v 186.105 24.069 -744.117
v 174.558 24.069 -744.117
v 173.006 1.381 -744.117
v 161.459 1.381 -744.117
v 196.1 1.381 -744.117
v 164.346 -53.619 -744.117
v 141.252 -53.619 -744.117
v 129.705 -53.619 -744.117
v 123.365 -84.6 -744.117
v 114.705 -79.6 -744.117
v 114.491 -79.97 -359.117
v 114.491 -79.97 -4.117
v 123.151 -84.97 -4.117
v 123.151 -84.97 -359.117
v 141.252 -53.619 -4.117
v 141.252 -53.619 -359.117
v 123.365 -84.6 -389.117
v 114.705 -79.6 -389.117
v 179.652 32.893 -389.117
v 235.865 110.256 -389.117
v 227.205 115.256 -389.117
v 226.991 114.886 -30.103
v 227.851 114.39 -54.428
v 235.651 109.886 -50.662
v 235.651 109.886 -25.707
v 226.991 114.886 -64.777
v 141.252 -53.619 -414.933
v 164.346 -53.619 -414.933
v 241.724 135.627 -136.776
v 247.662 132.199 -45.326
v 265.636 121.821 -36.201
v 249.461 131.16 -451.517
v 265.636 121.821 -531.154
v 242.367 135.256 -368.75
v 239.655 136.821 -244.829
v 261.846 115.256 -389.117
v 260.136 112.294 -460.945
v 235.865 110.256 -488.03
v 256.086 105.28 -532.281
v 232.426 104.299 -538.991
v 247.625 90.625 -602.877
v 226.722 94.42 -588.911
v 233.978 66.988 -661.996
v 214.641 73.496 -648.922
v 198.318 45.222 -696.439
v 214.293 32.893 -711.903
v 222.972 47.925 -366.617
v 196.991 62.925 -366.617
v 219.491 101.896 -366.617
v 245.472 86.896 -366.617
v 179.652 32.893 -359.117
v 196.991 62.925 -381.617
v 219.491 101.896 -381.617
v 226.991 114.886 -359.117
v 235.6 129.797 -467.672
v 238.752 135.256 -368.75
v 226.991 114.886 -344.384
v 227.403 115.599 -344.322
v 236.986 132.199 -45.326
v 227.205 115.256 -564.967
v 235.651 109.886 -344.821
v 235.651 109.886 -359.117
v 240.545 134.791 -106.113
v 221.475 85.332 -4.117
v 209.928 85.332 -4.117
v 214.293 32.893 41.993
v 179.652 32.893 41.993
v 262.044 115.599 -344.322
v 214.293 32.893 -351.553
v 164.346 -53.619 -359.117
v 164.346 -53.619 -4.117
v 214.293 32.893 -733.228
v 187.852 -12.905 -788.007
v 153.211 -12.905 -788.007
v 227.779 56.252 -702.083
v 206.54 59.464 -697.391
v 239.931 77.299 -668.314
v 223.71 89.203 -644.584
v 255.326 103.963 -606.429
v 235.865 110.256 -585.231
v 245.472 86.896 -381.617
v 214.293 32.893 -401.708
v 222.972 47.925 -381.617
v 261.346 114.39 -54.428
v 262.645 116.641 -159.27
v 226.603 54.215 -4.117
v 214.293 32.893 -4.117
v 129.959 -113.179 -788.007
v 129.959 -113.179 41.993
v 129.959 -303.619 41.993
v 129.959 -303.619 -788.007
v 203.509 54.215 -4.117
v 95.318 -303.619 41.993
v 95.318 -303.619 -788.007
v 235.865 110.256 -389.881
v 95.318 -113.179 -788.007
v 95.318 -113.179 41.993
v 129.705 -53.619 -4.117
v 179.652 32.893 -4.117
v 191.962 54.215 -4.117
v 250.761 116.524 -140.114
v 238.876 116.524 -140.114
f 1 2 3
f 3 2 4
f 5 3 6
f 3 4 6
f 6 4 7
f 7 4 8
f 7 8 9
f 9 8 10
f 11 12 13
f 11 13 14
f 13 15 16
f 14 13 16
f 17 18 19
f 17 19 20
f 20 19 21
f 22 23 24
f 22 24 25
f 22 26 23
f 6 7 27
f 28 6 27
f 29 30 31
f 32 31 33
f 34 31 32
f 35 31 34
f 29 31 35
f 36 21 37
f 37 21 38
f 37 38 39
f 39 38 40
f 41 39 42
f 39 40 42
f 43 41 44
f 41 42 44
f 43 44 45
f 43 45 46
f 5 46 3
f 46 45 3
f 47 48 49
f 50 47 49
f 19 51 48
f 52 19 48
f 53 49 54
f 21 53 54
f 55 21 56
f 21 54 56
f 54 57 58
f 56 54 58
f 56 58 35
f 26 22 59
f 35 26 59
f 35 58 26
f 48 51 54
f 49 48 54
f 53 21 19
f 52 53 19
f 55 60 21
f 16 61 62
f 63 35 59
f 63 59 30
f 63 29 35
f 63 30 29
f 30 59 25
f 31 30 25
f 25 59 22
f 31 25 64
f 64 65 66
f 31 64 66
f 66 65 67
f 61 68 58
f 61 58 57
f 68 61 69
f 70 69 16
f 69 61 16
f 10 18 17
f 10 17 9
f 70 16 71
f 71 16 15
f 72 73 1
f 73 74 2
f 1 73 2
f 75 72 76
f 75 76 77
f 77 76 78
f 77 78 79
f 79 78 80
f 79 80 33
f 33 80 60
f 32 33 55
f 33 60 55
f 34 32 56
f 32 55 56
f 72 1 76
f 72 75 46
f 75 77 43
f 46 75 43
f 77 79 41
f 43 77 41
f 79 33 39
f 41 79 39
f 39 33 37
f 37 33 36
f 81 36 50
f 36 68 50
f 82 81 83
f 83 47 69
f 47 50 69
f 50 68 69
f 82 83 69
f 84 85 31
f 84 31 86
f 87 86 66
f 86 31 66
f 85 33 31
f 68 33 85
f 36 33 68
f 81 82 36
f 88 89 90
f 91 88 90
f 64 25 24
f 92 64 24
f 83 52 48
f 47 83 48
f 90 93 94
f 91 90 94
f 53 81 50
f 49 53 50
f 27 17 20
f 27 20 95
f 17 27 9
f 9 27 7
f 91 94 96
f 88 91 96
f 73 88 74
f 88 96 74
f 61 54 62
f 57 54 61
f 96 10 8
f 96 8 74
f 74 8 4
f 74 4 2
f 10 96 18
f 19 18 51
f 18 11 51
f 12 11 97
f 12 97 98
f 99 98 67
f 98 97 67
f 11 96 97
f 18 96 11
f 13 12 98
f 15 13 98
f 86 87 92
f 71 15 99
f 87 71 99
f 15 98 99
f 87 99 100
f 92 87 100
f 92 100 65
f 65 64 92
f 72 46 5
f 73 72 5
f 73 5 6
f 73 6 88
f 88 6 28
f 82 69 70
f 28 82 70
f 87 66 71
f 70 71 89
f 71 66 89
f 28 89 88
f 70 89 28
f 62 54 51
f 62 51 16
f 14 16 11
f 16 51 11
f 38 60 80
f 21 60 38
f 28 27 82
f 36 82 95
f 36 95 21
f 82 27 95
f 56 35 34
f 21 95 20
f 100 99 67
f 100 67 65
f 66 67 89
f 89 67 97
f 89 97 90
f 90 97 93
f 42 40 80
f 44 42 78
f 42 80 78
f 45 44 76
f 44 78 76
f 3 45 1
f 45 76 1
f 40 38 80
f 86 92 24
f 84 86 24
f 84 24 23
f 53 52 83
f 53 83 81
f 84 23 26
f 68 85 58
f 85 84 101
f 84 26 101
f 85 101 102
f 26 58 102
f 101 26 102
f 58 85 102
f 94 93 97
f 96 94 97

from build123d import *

# Parameters (mm, degrees)
EXTRUDE_1_DEPTH          = 300
CUT_EXTRUDE_1_DEPTH      = 1.0000001
CUT_EXTRUDE_1_DEPTH_BACK = 831.0000001
SKETCH_4_W               = 15
SKETCH_4_H               = 45
CUT_EXTRUDE_2_DEPTH      = 243.720162759
SKETCH_4_3_W             = 15
SKETCH_4_3_H             = 45
CUT_EXTRUDE_3_DEPTH      = 10


with BuildPart() as part:
    # 스케치1 → 보스-돌출1 (new body)
    with BuildSketch(Plane(origin=(0, 0, 0), x_dir=(0, 0, -1), z_dir=(1, 0, 0))):
        with BuildLine():
            Line((-41.993007726, 32.892860384), (-41.993007726, -303.619075042))
            Line((-41.993007726, -303.619075042), (788.006992274, -303.619075042))
            Line((788.006992274, -303.619075042), (788.006992274, -12.90547458))
            add(Edge.make_bspline(
                [(788.006992274, -12.90547458), (680.261509472, 78.254339674), (631.210016853, 128.415858034), (368.750142796, 135.255878696)],
                knots=[0, 0, 0, 0, 1, 1, 1, 1], degree=3))
            add(Edge.make_bspline(
                [(45.325655749, 132.198658827), (134.989620851, 137.211386353), (265.463569923, 138.011524869), (368.750142796, 135.255878696)],
                knots=[0, 0, 0, 0, 1, 1, 1, 1], degree=3))
            Line((45.325655749, 132.198658827), (-41.993007726, 32.892860384))
        make_face()
        with BuildLine():
            Line((4.116595834, 54.214584045), (54.427658026, 114.389853292))
            add(Edge.make_bspline(
                [(54.427658026, 114.389853292), (122.914694658, 118.068796405), (254.727094278, 116.434615788), (344.321994749, 115.599177573)],
                knots=[0, 0, 0, 0, 0.843637698, 0.843637698, 0.843637698, 0.843637698], degree=3))
            Line((344.321994749, 115.599177573), (359.116595834, -53.619075042))
            Line((359.116595834, -53.619075042), (4.116595834, -53.619075042))
            Line((4.116595834, -53.619075042), (4.116595834, 54.214584045))
        make_face(mode=Mode.SUBTRACT)
        with BuildLine():
            Line((414.932922958, -53.619075042), (389.116595834, 115.255878696))
            add(Edge.make_bspline(
                [(389.116595834, 115.255878696), (584.597474826, 110.825479528), (668.447748965, 84.913988672), (744.116595834, 1.380924958)],
                knots=[0.027735734, 0.027735734, 0.027735734, 0.027735734, 0.842070206, 0.842070206, 0.842070206, 0.842070206], degree=3))
            Line((744.116595834, 1.380924958), (744.116595834, -53.619075042))
            Line((744.116595834, -53.619075042), (414.932922958, -53.619075042))
        make_face(mode=Mode.SUBTRACT)
    extrude(amount=EXTRUDE_1_DEPTH)

    # 스케치2 → 컷-돌출1 (cut, two sides)
    with BuildSketch(Plane.XY.offset(41.993007726)) as cut_extrude_1_sk:
        Polygon((179.652203691, 32.892860384), (239.655287588, 136.821250303), (265.636049701, 121.821250303), (214.293219842, 32.892860384), (300, 32.892860384), (300, -303.619075042), (341.364714008, -303.619075042), (341.364714008, 251.457374482), (0, 251.457374482), (0, 32.892860384), align=None)
        Polygon((95.31772029, -113.178749697), (179.652203691, 32.892860384), (0, 32.892860384), (0, -303.619075042), (95.31772029, -303.619075042), align=None)
        Polygon((300, 32.892860384), (214.293219842, 32.892860384), (129.958736441, -113.178749697), (129.958736441, -303.619075042), (300, -303.619075042), align=None)
    extrude(amount=CUT_EXTRUDE_1_DEPTH, mode=Mode.SUBTRACT)
    extrude(cut_extrude_1_sk.sketch, amount=-CUT_EXTRUDE_1_DEPTH_BACK, mode=Mode.SUBTRACT)

    # 스케치4 → 컷-돌출2 (cut, through all)
    with BuildSketch(Plane(origin=(120.496126421, -69.568471025, 0), x_dir=(0, 0, 1), z_dir=(-0.866025404, 0.5, 0))):
        with Locations((-374.116595834, 175.489898801)):
            Rectangle(SKETCH_4_W, SKETCH_4_H)
    extrude(amount=-CUT_EXTRUDE_2_DEPTH, mode=Mode.SUBTRACT)

    # 스케치4<3> → 컷-돌출3 (cut)
    with BuildSketch(Plane(origin=(120.496126421, -69.568471025, 0), x_dir=(0, 0, 1), z_dir=(-0.866025404, 0.5, 0))):
        Polygon((-744.116595834, 18.416776129), (-744.116595834, 213.416776129), (-389.116595834, 213.416776129), (-389.116595834, 17.989898801), (-389.116595834, -11.583223871), (-744.116595834, -11.583223871), align=None)
        Polygon((-359.116595834, 18.416776129), (-359.116595834, 212.989898801), (-4.116595834, 212.989898801), (-4.116595834, 17.989898801), (-4.116595834, -12.010101199), (-359.116595834, -12.010101199), align=None)
        with Locations((-374.116595834, 175.489898801)):
            Rectangle(SKETCH_4_3_W, SKETCH_4_3_H)
    extrude(amount=-CUT_EXTRUDE_3_DEPTH, mode=Mode.SUBTRACT)


solid = part.part
